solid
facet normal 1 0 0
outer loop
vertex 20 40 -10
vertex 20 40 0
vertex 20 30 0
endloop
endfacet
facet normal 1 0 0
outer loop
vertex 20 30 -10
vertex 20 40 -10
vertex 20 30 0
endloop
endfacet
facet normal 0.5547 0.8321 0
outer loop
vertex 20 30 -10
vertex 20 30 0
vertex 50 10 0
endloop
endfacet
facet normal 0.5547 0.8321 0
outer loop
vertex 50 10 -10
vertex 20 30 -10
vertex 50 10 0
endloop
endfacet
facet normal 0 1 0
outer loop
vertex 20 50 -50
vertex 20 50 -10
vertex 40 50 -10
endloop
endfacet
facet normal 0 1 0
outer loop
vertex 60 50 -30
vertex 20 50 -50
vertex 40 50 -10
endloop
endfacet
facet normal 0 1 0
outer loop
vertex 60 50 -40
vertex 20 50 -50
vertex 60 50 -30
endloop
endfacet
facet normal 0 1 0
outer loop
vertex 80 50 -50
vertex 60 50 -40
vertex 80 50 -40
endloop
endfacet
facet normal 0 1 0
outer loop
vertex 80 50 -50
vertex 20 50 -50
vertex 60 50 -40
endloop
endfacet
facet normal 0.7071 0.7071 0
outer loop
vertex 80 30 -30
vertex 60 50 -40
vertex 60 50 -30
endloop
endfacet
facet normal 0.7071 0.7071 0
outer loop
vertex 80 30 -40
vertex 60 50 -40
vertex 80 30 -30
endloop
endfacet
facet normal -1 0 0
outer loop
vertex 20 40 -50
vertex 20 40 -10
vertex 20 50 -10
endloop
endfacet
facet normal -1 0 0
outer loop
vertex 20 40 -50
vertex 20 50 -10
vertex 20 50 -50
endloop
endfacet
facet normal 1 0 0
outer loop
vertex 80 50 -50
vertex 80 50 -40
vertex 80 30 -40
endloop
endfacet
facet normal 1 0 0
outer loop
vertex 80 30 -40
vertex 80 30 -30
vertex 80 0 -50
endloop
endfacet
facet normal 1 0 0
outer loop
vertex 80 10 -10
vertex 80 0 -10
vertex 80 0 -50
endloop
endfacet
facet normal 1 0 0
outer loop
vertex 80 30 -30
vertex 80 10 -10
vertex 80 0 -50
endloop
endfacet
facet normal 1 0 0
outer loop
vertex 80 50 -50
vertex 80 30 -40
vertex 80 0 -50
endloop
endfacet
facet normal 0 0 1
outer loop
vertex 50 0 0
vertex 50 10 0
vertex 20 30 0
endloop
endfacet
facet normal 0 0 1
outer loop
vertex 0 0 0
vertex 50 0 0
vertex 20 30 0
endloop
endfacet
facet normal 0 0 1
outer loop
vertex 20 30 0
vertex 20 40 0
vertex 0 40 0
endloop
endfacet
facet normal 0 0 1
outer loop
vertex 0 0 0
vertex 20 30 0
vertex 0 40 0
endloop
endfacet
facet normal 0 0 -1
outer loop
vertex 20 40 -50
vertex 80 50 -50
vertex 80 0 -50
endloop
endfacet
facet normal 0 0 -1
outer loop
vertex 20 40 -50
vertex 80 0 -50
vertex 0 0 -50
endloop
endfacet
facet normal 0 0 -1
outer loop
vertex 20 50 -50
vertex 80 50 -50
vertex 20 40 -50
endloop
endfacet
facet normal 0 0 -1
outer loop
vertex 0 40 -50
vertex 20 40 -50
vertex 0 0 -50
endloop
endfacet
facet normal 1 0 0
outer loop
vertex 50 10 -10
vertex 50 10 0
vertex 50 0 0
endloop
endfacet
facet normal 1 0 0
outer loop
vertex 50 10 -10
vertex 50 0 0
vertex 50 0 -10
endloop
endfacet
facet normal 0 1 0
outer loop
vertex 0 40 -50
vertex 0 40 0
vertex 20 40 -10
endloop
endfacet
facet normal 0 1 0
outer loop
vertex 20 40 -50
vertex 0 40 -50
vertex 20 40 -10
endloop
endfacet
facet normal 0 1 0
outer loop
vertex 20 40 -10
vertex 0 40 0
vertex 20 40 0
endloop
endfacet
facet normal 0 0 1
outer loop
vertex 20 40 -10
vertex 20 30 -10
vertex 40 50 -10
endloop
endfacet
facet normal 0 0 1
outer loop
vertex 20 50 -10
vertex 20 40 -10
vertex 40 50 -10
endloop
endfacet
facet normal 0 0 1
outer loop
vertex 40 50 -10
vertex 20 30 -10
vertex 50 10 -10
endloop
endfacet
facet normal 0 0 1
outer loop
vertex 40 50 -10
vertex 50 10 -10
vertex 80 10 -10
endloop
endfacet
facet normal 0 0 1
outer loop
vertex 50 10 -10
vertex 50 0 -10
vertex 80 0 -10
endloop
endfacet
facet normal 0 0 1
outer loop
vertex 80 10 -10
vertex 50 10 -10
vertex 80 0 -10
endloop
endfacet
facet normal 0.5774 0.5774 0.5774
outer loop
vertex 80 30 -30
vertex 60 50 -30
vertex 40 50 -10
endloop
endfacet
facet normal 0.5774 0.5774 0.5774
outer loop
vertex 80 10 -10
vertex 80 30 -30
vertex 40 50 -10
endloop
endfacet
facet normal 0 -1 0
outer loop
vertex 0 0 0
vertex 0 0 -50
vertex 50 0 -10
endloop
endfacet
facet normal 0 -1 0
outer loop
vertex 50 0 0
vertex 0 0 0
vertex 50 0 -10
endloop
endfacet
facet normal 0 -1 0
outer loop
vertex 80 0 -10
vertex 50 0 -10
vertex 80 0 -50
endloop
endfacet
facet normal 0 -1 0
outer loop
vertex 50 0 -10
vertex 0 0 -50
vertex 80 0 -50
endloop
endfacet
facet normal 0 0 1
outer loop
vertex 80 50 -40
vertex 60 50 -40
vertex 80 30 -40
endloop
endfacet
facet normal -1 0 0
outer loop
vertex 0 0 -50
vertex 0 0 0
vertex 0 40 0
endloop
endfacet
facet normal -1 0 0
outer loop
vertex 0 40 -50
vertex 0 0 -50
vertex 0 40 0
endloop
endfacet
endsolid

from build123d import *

# Parameters (mm, degrees)
SKETCH2_W           = 80
SKETCH2_H           = 50
BOSS_EXTRUDE1_DEPTH = 10
SKETCH3_W           = 30
SKETCH3_H           = 10
CUT_EXTRUDE1_DEPTH  = 10
SKETCH4_W           = 60
SKETCH4_H           = 40
BOSS_EXTRUDE2_DEPTH = 40
BOSS_EXTRUDE3_DEPTH = 50
CUT_EXTRUDE2_DEPTH  = 50
CUT_EXTRUDE3_DEPTH  = 50


with BuildPart() as part:
    # Sketch2 → Boss-Extrude1 (new body)
    with BuildSketch(Plane(origin=(0, 0, 0), x_dir=(1, 0, 0), z_dir=(0, 1, 0))):
        with Locations((40, 25)):
            Rectangle(SKETCH2_W, SKETCH2_H)
    extrude(amount=BOSS_EXTRUDE1_DEPTH)

    # Sketch3 → Cut-Extrude1 (cut)
    with BuildSketch(Plane(origin=(0, 10, 0), x_dir=(1, 0, 0), z_dir=(0, 1, 0))):
        with Locations((65, 5)):
            Rectangle(SKETCH3_W, SKETCH3_H)
    extrude(amount=-CUT_EXTRUDE1_DEPTH, mode=Mode.SUBTRACT)

    # Sketch4 → Boss-Extrude2 (add)
    with BuildSketch(Plane(origin=(0, 10, 0), x_dir=(1, 0, 0), z_dir=(0, 1, 0))):
        with Locations((50, 30)):
            Rectangle(SKETCH4_W, SKETCH4_H)
    extrude(amount=BOSS_EXTRUDE2_DEPTH)

    # Sketch5 → Boss-Extrude3 (add)
    with BuildSketch(Plane.XY):
        Polygon((20, 30), (50, 10), (0, 10), (0, 40), (20, 40), align=None)
    extrude(amount=-BOSS_EXTRUDE3_DEPTH)

    # Sketch6 → Cut-Extrude2 (cut)
    with BuildSketch(Plane.XY.offset(-40)):
        Polygon((60, 50), (80, 30), (80, 50), align=None)
    extrude(amount=CUT_EXTRUDE2_DEPTH, mode=Mode.SUBTRACT)

    # Sketch9 → Cut-Extrude3 (cut)
    with BuildSketch(Plane(origin=(26.666666667, 26.666666667, 26.666666667), x_dir=(-0.816496581, 0.40824829, 0.40824829), z_dir=(-0.577350269, -0.577350269, -0.577350269))):
        Polygon((-16.329931619, 42.426406871), (-40.824829046, 56.568542495), (-65.319726474, 42.426406871), (-65.319726474, 14.142135624), align=None)
    extrude(amount=-CUT_EXTRUDE3_DEPTH, mode=Mode.SUBTRACT)


solid = part.part
